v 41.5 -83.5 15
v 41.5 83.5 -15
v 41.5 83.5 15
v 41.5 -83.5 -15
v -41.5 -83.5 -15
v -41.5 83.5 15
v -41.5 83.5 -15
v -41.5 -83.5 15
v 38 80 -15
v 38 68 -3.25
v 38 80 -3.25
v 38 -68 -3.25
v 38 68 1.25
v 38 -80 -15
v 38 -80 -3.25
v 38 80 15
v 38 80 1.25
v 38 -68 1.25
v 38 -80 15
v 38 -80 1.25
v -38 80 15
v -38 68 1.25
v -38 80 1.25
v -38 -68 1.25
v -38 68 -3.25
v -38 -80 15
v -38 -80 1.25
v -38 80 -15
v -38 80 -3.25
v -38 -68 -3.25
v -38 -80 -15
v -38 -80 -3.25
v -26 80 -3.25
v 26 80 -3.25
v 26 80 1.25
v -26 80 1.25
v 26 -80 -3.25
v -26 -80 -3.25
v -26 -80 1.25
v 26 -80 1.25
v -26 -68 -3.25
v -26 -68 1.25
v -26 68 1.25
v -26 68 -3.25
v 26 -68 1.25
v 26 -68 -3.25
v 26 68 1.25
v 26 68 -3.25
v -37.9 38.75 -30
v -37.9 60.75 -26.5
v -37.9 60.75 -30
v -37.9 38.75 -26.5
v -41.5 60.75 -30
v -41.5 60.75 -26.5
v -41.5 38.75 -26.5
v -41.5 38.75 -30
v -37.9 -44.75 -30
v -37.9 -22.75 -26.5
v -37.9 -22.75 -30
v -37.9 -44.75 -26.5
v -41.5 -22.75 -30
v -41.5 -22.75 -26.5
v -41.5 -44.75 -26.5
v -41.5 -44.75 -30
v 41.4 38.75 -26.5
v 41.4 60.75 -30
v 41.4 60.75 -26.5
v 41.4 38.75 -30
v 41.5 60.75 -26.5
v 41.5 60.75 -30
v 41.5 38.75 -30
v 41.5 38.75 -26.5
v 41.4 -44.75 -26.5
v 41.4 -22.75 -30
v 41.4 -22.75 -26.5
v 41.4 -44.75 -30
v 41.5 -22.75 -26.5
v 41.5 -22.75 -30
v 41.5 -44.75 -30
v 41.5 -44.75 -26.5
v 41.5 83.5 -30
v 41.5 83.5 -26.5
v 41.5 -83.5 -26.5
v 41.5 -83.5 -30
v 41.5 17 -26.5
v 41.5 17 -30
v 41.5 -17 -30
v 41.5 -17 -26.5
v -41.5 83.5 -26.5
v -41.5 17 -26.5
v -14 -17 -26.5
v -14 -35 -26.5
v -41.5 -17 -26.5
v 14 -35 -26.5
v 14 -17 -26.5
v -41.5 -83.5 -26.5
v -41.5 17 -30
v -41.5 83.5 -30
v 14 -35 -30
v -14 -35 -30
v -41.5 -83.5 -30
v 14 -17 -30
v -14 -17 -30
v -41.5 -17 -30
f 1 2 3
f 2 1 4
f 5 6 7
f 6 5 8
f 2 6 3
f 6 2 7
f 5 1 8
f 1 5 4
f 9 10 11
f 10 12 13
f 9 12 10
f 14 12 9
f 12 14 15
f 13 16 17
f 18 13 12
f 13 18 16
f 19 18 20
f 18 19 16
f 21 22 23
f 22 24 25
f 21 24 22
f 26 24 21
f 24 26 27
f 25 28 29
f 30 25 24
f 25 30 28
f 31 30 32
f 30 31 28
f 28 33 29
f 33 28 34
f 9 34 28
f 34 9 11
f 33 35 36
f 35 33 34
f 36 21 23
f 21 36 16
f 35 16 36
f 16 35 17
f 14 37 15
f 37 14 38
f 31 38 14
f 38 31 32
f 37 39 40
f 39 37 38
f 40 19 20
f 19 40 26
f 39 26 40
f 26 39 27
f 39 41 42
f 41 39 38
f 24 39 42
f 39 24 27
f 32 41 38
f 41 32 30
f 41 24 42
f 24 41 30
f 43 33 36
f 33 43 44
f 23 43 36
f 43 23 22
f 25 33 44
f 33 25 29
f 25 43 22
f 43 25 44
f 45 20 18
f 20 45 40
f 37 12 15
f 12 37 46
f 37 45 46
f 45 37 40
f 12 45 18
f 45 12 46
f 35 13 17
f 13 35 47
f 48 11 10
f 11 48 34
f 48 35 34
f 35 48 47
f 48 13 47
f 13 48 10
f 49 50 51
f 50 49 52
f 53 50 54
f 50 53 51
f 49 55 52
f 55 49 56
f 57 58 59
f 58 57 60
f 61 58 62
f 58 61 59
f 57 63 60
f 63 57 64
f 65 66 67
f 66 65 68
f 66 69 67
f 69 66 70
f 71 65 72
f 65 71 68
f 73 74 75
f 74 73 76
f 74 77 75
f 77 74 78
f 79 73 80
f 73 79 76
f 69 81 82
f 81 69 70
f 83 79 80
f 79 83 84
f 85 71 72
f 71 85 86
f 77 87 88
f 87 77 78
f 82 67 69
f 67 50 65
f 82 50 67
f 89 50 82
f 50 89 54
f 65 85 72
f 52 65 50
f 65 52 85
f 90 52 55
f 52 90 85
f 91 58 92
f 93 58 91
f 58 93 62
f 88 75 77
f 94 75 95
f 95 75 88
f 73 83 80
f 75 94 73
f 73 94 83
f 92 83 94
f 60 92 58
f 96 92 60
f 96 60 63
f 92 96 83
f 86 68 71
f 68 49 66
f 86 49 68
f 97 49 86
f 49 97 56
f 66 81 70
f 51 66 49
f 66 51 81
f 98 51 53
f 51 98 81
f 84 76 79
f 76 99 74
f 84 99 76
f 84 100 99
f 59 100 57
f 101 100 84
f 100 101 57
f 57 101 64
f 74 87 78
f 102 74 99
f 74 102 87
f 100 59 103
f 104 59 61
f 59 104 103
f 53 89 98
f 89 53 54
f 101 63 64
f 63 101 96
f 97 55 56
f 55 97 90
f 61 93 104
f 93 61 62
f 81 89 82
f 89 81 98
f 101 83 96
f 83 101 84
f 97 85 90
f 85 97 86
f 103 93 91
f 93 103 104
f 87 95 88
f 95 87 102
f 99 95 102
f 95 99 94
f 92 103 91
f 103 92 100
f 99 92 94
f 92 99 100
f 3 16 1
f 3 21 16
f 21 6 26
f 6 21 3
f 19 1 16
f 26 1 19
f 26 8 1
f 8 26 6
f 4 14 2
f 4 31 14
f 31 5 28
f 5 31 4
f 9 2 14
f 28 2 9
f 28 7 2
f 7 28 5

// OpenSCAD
// ═══════════════════════════════════════════════════════════
//  RhythmRide VR Phone Cradle — OpenSCAD
//  No lenses required. Phone held at ~30 cm from eyes.
//  Prints in ~35 min: 0.3 mm layers, 20% infill, no supports.
//
//  HOW TO PRINT:
//    1. Open this file in OpenSCAD (free: openscad.org)
//    2. Adjust parameters below for your phone
//    3. File → Export → Export as STL
//    4. Slice in Cura/PrusaSlicer:
//         - Layer height : 0.30 mm
//         - Infill       : 20%
//         - Supports     : OFF
//         - Walls        : 2
//    5. Print time ≈ 30–38 min on most FDM printers
//
//  ASSEMBLY:
//    - Slide phone into cradle slot (friction fit)
//    - Thread velcro / rubber-band through the 4 strap slots
//    - Loop strap around head
// ═══════════════════════════════════════════════════════════

// ── Parameters — change these for your phone ─────────────
PHONE_W      = 76;    // phone width  (mm) — measure with case
PHONE_H      = 160;   // phone height (mm) — measure with case
PHONE_THICK  = 10;    // phone thickness with case (mm)
PHONE_DIST   = 30;    // eye-to-phone distance (mm) — 28–35 recommended

// Eye gap: the opening you look through
EYE_W        = 60;    // horizontal eye gap width (mm)
EYE_H        = 34;    // vertical eye gap height (mm)
NOSE_W       = 28;    // nose bridge notch width (mm)
NOSE_H       = 18;    // nose bridge notch depth (mm)

// Frame geometry
WALL         = 3.5;   // wall thickness (mm) — keep ≥ 3 for rigidity
STRAP_SLOT_W = 22;    // width of elastic strap slots (mm)
STRAP_SLOT_H = 6;     // height of strap slots (mm)

// Bevel / fillet (cosmetic)
BEVEL        = 2;

// ── Derived dimensions ─────────────────────────────────────
cradle_W = PHONE_W + 2*WALL;
cradle_H = PHONE_H + 2*WALL;
box_D    = PHONE_THICK + WALL;   // depth of phone pocket
tube_D   = PHONE_DIST;           // length of tube from face-plate to phone
total_D  = box_D + tube_D;

// ══════════════════════════════════════════════════════════
//  MAIN ASSEMBLY
// ══════════════════════════════════════════════════════════
union() {
    phone_cradle();
    translate([0, 0, -tube_D])
        face_plate();
    translate([0, 0, -tube_D/2])
        tube_walls();
}

// ══════════════════════════════════════════════════════════
//  PHONE CRADLE (back box that holds the phone)
// ══════════════════════════════════════════════════════════
module phone_cradle() {
    difference() {
        // Outer shell
        translate([-cradle_W/2, -cradle_H/2, 0])
            cube([cradle_W, cradle_H, box_D]);

        // Inner phone pocket (open at front, closed at back)
        translate([-PHONE_W/2, -PHONE_H/2, WALL])
            cube([PHONE_W, PHONE_H, PHONE_THICK + 1]);

        // Open face (phone inserts from the front)
        translate([-PHONE_W/2, -PHONE_H/2, -0.1])
            cube([PHONE_W, PHONE_H, WALL + 0.2]);
    }

    // Lip retainer (keeps phone from sliding out front)
    // 4 corner tabs, 6mm wide
    for (x = [-1, 1], y = [-1, 1]) {
        translate([
            x * (PHONE_W/2 - 6),
            y * (PHONE_H/2 - 6),
            -1
        ])
            cube([12, 12, WALL + 1], center=true);
    }
}

// ══════════════════════════════════════════════════════════
//  FACE PLATE (eye pieces + nose bridge + strap slots)
// ══════════════════════════════════════════════════════════
module face_plate() {
    difference() {
        // Plate body
        translate([-cradle_W/2, -cradle_H/2, 0])
            cube([cradle_W, cradle_H, WALL]);

        // Left eye hole
        translate([-EYE_W/2 - NOSE_W/2, -EYE_H/2, -0.1])
            cube([EYE_W, EYE_H, WALL + 0.2]);

        // Right eye hole
        translate([NOSE_W/2, -EYE_H/2, -0.1])
            cube([EYE_W, EYE_H, WALL + 0.2]);

        // Nose bridge cutout (bottom centre)
        translate([-NOSE_W/2, -NOSE_H - EYE_H/2, -0.1])
            cube([NOSE_W, NOSE_H, WALL + 0.2]);

        // Strap slots — left side (2 slots, top & bottom)
        for (y = [cradle_H/4, -cradle_H/4]) {
            translate([
                -cradle_W/2 - 0.1,
                y - STRAP_SLOT_H/2,
                (WALL - STRAP_SLOT_H)/2
            ])
                cube([WALL + 0.2, STRAP_SLOT_W, STRAP_SLOT_H]);
        }

        // Strap slots — right side
        for (y = [cradle_H/4, -cradle_H/4]) {
            translate([
                cradle_W/2 - 0.1,
                y - STRAP_SLOT_H/2,
                (WALL - STRAP_SLOT_H)/2
            ])
                cube([WALL + 0.2, STRAP_SLOT_W, STRAP_SLOT_H]);
        }
    }
}

// ══════════════════════════════════════════════════════════
//  TUBE WALLS (4 sides connecting face-plate to cradle)
//  Open top & bottom to keep print fast and light.
// ══════════════════════════════════════════════════════════
module tube_walls() {
    half_W = cradle_W/2;
    half_H = cradle_H/2;

    // Left wall
    translate([-half_W, -half_H, 0])
        cube([WALL, cradle_H, tube_D]);

    // Right wall
    translate([half_W - WALL, -half_H, 0])
        cube([WALL, cradle_H, tube_D]);

    // Top wall (partial — don't block top edge, preserves fast print)
    translate([-half_W, half_H - WALL, 0])
        cube([cradle_W, WALL, tube_D]);

    // Bottom wall
    translate([-half_W, -half_H, 0])
        cube([cradle_W, WALL, tube_D]);
}

// ══════════════════════════════════════════════════════════
//  NOTES
// ══════════════════════════════════════════════════════════
// - Total part size ≈ 82 × 166 × 45 mm (default params)
// - Print standing upright (long axis vertical) for best strength
// - Viewing: hold unit to face, eyes aligned with cutouts
// - Phone screen should be landscape, showing AR game full-screen
// - Strap: thread 20 mm velcro strip through the 4 slots,
//   loop around back of head, press velcro together
// - Optional: hot-glue a foam strip along the face plate rim
//   for comfort and light seal
